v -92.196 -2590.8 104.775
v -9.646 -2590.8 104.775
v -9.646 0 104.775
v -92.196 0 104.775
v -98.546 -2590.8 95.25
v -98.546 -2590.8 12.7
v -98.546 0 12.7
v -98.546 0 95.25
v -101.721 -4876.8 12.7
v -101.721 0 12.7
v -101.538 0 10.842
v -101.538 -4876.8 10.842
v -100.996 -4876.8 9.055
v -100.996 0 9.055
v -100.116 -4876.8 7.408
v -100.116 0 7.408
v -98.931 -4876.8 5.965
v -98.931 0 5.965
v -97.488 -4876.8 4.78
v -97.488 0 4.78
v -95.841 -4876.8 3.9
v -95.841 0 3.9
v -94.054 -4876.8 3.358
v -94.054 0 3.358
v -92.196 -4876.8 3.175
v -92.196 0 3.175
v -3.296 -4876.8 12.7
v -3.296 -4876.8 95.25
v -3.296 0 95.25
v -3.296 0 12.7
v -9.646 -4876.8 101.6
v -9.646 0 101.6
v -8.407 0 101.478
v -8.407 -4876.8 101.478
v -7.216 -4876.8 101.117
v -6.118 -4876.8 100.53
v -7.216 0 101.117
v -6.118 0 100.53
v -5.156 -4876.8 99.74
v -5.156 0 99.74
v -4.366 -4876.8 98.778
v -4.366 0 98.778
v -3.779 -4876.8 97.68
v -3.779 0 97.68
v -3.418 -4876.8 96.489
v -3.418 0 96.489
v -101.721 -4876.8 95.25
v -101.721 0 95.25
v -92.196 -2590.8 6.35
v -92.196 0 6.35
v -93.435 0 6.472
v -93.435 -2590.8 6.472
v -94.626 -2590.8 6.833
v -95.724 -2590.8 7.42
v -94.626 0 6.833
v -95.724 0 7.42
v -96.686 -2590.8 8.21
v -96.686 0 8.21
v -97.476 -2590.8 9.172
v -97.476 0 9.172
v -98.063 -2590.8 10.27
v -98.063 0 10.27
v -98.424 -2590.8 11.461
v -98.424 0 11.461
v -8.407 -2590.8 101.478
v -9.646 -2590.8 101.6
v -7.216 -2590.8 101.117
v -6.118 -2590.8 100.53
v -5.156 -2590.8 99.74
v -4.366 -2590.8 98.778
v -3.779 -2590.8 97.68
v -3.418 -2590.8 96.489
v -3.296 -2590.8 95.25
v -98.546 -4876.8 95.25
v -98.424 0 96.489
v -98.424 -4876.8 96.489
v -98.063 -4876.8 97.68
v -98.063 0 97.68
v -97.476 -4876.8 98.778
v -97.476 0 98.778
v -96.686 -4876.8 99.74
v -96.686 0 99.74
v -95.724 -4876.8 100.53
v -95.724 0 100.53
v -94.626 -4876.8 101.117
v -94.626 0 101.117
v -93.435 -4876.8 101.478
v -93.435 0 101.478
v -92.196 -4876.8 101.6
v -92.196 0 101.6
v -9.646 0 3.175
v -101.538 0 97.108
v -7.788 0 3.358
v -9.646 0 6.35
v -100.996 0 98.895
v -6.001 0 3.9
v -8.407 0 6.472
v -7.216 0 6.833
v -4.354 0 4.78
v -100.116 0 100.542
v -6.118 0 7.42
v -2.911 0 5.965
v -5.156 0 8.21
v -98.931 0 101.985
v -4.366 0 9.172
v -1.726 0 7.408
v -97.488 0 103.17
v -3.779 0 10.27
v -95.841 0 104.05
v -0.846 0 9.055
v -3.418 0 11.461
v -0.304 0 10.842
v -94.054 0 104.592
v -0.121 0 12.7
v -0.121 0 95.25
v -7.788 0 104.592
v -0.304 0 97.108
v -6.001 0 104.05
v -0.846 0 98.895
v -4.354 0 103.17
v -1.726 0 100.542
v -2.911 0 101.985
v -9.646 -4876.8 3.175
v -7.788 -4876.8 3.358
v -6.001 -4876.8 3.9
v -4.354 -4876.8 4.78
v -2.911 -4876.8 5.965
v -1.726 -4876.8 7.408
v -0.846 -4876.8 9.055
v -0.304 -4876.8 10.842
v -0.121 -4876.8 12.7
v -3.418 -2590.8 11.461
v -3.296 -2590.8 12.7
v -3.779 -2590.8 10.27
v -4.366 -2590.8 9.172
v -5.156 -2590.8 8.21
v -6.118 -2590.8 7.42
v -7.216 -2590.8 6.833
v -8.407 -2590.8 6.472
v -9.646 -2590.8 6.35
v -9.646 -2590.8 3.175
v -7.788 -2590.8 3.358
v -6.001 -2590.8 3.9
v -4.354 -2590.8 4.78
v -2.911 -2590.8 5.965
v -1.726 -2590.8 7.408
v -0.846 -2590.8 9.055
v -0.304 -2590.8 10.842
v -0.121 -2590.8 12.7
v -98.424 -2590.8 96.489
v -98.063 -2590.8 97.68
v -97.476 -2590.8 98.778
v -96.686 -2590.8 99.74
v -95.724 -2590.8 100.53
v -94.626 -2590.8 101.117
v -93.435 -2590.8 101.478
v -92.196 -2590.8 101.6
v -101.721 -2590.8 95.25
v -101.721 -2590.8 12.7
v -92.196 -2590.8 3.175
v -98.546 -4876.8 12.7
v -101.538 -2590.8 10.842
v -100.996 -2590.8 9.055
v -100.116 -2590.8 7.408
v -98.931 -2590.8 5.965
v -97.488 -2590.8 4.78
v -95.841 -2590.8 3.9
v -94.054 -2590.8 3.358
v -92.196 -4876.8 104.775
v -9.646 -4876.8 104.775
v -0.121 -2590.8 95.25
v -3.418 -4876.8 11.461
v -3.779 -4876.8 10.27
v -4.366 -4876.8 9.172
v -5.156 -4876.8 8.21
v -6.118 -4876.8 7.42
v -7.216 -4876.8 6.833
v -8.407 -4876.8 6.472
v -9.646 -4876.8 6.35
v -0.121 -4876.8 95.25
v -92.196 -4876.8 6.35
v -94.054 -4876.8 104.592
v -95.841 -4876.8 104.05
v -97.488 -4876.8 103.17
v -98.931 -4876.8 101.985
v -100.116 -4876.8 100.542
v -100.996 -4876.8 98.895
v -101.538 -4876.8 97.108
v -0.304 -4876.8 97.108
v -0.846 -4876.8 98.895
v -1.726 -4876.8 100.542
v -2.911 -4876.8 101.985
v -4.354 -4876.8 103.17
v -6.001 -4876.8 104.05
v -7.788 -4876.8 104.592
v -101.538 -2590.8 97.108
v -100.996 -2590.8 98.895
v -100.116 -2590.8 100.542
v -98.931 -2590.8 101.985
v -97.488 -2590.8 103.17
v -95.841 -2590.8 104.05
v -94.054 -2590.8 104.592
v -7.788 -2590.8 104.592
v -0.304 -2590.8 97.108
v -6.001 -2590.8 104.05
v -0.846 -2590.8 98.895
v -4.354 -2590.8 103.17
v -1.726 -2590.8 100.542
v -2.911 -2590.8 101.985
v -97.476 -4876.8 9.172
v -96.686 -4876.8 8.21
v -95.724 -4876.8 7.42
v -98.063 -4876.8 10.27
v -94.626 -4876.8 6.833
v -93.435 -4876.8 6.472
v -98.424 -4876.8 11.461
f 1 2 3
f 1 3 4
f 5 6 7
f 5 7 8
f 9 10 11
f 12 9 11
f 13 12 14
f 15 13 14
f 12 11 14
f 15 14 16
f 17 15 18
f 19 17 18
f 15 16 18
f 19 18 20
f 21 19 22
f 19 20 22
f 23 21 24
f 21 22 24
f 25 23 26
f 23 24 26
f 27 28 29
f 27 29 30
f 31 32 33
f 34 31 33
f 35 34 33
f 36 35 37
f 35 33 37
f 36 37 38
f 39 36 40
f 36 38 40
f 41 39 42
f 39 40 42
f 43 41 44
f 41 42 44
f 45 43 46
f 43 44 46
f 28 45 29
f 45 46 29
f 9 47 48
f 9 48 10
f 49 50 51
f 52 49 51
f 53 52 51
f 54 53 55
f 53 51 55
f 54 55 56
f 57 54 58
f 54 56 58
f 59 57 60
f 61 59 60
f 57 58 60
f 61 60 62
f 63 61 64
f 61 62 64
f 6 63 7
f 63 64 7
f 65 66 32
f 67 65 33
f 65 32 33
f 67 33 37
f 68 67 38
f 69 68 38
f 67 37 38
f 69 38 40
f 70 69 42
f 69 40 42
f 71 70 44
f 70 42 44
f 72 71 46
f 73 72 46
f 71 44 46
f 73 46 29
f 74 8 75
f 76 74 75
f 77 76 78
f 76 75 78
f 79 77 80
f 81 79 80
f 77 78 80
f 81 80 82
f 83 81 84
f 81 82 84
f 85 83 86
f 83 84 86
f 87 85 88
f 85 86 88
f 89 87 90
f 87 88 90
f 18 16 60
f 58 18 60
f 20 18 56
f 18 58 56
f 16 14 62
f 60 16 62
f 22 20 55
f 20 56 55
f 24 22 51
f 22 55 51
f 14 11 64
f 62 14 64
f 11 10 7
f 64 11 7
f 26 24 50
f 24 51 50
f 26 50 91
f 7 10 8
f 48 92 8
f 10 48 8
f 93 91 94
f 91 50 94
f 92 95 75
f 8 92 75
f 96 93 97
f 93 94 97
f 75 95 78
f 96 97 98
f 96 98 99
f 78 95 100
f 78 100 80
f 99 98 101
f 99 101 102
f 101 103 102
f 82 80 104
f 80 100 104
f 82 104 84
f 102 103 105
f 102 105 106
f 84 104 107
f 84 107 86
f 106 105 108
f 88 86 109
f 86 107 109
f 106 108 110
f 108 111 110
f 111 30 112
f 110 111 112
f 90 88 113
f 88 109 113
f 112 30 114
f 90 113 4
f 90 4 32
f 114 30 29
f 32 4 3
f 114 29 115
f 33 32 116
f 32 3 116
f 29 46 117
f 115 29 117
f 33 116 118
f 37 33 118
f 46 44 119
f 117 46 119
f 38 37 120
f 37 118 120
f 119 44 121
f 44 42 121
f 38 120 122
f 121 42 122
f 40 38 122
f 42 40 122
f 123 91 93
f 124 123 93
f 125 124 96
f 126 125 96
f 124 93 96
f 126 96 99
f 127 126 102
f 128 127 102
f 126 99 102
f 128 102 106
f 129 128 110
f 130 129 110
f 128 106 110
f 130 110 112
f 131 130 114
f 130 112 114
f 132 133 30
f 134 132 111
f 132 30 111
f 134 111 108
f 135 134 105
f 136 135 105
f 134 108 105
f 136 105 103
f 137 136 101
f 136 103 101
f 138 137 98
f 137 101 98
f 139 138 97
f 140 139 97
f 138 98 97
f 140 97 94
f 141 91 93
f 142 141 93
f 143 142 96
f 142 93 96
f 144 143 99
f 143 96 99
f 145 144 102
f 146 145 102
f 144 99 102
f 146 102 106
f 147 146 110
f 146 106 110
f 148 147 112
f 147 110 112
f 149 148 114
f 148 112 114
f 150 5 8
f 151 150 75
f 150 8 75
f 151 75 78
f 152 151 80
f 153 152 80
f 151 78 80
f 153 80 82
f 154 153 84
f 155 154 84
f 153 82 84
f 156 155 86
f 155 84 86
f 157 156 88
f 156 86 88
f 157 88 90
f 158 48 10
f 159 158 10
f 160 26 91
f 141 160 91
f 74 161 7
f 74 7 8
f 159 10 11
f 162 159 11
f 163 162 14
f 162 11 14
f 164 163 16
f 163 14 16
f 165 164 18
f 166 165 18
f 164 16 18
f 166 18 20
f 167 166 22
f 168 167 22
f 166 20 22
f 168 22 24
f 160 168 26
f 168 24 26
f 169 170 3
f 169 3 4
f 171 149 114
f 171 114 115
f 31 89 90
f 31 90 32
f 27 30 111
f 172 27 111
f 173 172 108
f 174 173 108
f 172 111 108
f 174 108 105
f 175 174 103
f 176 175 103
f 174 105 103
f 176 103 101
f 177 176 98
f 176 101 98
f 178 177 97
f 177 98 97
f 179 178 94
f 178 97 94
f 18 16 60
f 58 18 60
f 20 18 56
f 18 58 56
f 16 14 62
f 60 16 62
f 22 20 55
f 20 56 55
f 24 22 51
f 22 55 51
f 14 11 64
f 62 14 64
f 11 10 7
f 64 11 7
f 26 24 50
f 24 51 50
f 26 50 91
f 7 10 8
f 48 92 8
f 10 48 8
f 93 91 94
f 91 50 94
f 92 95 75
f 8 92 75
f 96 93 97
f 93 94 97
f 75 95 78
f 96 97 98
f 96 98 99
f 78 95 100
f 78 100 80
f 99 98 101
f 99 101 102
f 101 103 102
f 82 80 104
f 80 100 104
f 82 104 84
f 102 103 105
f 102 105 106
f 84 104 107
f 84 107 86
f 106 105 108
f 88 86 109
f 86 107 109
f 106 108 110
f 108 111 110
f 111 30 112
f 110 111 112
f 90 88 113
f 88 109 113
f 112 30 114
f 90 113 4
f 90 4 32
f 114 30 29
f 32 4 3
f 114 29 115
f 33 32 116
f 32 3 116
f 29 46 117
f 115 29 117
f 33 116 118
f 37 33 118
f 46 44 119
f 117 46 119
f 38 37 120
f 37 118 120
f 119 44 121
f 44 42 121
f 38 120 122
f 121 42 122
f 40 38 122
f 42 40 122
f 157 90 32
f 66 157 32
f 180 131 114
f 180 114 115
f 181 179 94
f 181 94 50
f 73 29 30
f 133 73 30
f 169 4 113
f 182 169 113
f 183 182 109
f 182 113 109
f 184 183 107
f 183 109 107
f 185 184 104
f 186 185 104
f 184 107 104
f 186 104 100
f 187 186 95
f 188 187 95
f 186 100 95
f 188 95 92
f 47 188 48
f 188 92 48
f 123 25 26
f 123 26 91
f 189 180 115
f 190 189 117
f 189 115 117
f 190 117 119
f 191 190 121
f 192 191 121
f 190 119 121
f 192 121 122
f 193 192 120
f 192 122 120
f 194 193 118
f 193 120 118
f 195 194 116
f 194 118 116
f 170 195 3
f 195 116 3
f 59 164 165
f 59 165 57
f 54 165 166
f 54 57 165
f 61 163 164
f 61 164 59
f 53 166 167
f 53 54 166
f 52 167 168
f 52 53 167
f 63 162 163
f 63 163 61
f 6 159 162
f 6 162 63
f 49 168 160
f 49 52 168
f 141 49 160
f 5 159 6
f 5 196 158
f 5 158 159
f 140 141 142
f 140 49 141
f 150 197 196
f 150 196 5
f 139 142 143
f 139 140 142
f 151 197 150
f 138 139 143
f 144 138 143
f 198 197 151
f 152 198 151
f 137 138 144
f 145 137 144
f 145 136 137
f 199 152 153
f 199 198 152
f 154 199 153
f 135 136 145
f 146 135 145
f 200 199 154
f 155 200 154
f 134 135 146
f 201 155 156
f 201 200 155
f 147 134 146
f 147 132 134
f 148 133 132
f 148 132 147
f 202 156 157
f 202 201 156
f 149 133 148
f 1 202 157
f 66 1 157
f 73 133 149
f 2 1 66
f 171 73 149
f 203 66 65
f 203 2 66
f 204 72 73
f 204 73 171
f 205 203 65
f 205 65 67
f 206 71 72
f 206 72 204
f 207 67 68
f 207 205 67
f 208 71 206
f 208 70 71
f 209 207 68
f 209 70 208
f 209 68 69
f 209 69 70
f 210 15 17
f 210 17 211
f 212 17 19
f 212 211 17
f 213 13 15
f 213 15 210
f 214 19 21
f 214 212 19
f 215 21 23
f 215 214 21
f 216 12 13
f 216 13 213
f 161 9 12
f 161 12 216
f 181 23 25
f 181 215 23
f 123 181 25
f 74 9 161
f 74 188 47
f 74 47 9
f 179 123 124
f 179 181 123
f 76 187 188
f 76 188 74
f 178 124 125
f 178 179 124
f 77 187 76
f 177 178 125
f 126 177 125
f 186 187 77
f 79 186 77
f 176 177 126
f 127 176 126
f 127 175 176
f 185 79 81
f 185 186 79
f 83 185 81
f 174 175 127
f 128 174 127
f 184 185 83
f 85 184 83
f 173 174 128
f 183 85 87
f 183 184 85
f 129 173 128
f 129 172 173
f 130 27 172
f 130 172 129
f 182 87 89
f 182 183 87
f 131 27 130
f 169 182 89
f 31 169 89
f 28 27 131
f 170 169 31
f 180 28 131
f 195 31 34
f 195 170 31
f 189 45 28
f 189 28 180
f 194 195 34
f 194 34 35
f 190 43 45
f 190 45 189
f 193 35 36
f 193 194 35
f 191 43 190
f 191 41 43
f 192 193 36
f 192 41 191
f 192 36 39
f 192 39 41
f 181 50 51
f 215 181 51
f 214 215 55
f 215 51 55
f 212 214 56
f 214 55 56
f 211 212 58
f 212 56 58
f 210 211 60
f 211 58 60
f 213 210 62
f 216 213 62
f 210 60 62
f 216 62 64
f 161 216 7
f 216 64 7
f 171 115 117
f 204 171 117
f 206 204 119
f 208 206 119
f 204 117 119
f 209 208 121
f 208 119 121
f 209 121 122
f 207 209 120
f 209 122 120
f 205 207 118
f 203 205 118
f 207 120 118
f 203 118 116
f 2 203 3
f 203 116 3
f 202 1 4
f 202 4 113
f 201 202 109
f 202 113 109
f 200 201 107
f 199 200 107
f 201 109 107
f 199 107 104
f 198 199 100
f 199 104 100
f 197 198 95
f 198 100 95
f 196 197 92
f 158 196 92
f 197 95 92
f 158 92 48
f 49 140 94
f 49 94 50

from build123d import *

# Parameters (mm, degrees)
F1_DEPTH = 4876.8
F2_DEPTH = 2590.8


with BuildPart() as f1:
    # F0 (on Front) → F1 (new body)
    with BuildSketch(Plane.XZ):
        with BuildLine():
            Line((-92.196079, 3.175), (-9.646079, 3.175))
            ThreePointArc((-9.646079, 3.175), (-2.910887, 5.964808), (-0.121079, 12.7))
            Line((-0.121079, 12.7), (-0.121079, 95.25))
            ThreePointArc((-0.121079, 95.25), (-2.910887, 101.985192), (-9.646079, 104.775))
            Line((-9.646079, 104.775), (-92.196079, 104.775))
            ThreePointArc((-92.196079, 104.775), (-98.931271, 101.985192), (-101.721079, 95.25))
            Line((-101.721079, 95.25), (-101.721079, 12.7))
            ThreePointArc((-101.721079, 12.7), (-98.931271, 5.964808), (-92.196079, 3.175))
        make_face()
        with BuildLine():
            ThreePointArc((-98.546079, 95.25), (-96.686207, 99.740128), (-92.196079, 101.6))
            Line((-92.196079, 101.6), (-9.646079, 101.6))
            ThreePointArc((-9.646079, 101.6), (-5.155951, 99.740128), (-3.296079, 95.25))
            Line((-3.296079, 95.25), (-3.296079, 12.7))
            ThreePointArc((-3.296079, 12.7), (-5.155951, 8.209872), (-9.646079, 6.35))
            Line((-9.646079, 6.35), (-92.196079, 6.35))
            ThreePointArc((-92.196079, 6.35), (-96.686207, 8.209872), (-98.546079, 12.7))
            Line((-98.546079, 12.7), (-98.546079, 95.25))
        make_face(mode=Mode.SUBTRACT)
    extrude(amount=F1_DEPTH)


with BuildPart() as f2:
    # F0 (on Front) → F2 (new body)
    with BuildSketch(Plane.XZ):
        with BuildLine():
            Line((-92.196079, 3.175), (-9.646079, 3.175))
            ThreePointArc((-9.646079, 3.175), (-2.910887, 5.964808), (-0.121079, 12.7))
            Line((-0.121079, 12.7), (-0.121079, 95.25))
            ThreePointArc((-0.121079, 95.25), (-2.910887, 101.985192), (-9.646079, 104.775))
            Line((-9.646079, 104.775), (-92.196079, 104.775))
            ThreePointArc((-92.196079, 104.775), (-98.931271, 101.985192), (-101.721079, 95.25))
            Line((-101.721079, 95.25), (-101.721079, 12.7))
            ThreePointArc((-101.721079, 12.7), (-98.931271, 5.964808), (-92.196079, 3.175))
        make_face()
        with BuildLine():
            ThreePointArc((-98.546079, 95.25), (-96.686207, 99.740128), (-92.196079, 101.6))
            Line((-92.196079, 101.6), (-9.646079, 101.6))
            ThreePointArc((-9.646079, 101.6), (-5.155951, 99.740128), (-3.296079, 95.25))
            Line((-3.296079, 95.25), (-3.296079, 12.7))
            ThreePointArc((-3.296079, 12.7), (-5.155951, 8.209872), (-9.646079, 6.35))
            Line((-9.646079, 6.35), (-92.196079, 6.35))
            ThreePointArc((-92.196079, 6.35), (-96.686207, 8.209872), (-98.546079, 12.7))
            Line((-98.546079, 12.7), (-98.546079, 95.25))
        make_face(mode=Mode.SUBTRACT)
    extrude(amount=F2_DEPTH)


solid = Compound([f1.part, f2.part])
